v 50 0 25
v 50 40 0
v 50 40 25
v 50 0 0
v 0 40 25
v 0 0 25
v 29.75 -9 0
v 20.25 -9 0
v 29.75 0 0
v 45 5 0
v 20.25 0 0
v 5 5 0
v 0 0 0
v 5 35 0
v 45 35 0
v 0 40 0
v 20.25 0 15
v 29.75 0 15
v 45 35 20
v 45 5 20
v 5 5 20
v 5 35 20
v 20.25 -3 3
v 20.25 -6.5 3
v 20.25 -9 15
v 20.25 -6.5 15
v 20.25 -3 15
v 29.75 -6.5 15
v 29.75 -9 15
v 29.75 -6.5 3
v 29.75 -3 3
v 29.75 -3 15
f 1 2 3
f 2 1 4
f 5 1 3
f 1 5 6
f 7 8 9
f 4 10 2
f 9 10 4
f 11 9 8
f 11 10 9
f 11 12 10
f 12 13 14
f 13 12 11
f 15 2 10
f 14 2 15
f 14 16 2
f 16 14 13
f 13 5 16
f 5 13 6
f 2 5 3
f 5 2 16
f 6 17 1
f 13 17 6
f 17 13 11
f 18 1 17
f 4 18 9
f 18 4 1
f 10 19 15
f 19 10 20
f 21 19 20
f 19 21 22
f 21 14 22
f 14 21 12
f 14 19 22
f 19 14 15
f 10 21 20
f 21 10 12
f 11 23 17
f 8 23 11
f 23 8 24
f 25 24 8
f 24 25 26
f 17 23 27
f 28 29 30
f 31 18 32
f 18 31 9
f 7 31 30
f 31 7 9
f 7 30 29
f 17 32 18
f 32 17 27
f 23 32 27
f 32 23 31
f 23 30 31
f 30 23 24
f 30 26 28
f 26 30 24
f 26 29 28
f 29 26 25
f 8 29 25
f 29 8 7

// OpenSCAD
// file: ../assets/container.scad
include <hanger.scad>

/** \module container
 * This draw 3D container with definied walls thickness, inside width, height
 * and depth. You must know that general width, height and depth is larger by
 * walls thickness.
 * @param width Width of the box inside it (X)
 * @param height Height of the box inside it (Z)
 * @param depth Depth of the box inside it (Y)
 * @param thickness Thickness of the walls
 */
module container(width, height, depth, thickness) {
    difference() {
        cube([
            width + thickness * 2, 
            height + thickness * 2, 
            depth + thickness
        ]);
        
        translate([thickness, thickness]) {
            cube([width, height, depth]);
        }
    }
}

/** \module hanging_container 
 * This module draw solid hanging container, that mean container with hanging 
 * module to place it on performed wall. 
 * @param container_width Width of container inside
 * @param container_height Height of container inside
 * @param container_depth Depth of container inside
 * @param container_wall_thickness Thickness of container walls
 * @param hole_width Width of hole in wall
 * @param hole_height Height of hole in wall
 * @param holes_spacing Space between holes in wall
 * @param wall_thickness Thickness of wall to place container on it
 */
module hanging_container(
    container_width, 
    container_height, 
    container_depth, 
    container_wall_thickness,
    hole_width,
    hole_height,
    holes_spacing,
    wall_thickness, 
) {
    container(
        container_width, 
        container_height, 
        container_depth, 
        container_wall_thickness
    );
    

    container_outside_width = container_width + container_wall_thickness * 2;
    container_width_fix_hanger = container_outside_width - (hole_width - 0.5);
    start_position = container_width_fix_hanger % holes_spacing / 2;
    
    for (count = [start_position : holes_spacing : container_outside_width]) {
        rotate([90, 0, 90]) translate([0 - wall_thickness * 3, 0, count]) {
            hanger_solid(hole_width, hole_height, wall_thickness);
        }
    }
}
// file: ../assets/hanger.scad
/** \module hanger_solid
 * This module create 3D solid for hanger to mount it on performated wall,
 * it can be glued to objects that would be placed on that wall.
 * @param width Width of the hanger, it must be less or equal to hole width
 * @param height Height of the hanger, it must be less to hole height 
 * @param thickness Thickness of the wall
 */
module hanger_solid(width, height, thickness) {
    linear_extrude(width - 0.5) {
        hanger_polygon(height, thickness);
    }
}

/** \module hanger_polygon
 * This module create 2D polygon for hanger, to use in models, that is 2D to
 * glued it before extrude.
 * @param height Height of the hanger, it must be less to hole height 
 * @param thickness Thickness of the wall
 */
module hanger_polygon(height, thickness) {
    polygon([
        [0, height],
        [0, 0],
        [thickness * 3, 0],
        [thickness * 3, height],
        [thickness * 2, height],
        [thickness * 2, thickness],
        [thickness - 0.5, thickness],
        [thickness - 0.5, height],
    ]);
}
// main file
include <../assets/hanger.scad>
include <../assets/container.scad>

/* Variables from command line */
width = 40;
height = 30;
depth = 20;
thickness = 3;
container_wall_thickness = 5;
hole_width = 10;
hole_height = 15;
holes_spacing = 50;
wall_thickness = 3;

/* Draw container */
hanging_container(
    width, 
    height, 
    depth, 
    container_wall_thickness, 
    hole_width, 
    hole_height, 
    holes_spacing, 
    wall_thickness
);
